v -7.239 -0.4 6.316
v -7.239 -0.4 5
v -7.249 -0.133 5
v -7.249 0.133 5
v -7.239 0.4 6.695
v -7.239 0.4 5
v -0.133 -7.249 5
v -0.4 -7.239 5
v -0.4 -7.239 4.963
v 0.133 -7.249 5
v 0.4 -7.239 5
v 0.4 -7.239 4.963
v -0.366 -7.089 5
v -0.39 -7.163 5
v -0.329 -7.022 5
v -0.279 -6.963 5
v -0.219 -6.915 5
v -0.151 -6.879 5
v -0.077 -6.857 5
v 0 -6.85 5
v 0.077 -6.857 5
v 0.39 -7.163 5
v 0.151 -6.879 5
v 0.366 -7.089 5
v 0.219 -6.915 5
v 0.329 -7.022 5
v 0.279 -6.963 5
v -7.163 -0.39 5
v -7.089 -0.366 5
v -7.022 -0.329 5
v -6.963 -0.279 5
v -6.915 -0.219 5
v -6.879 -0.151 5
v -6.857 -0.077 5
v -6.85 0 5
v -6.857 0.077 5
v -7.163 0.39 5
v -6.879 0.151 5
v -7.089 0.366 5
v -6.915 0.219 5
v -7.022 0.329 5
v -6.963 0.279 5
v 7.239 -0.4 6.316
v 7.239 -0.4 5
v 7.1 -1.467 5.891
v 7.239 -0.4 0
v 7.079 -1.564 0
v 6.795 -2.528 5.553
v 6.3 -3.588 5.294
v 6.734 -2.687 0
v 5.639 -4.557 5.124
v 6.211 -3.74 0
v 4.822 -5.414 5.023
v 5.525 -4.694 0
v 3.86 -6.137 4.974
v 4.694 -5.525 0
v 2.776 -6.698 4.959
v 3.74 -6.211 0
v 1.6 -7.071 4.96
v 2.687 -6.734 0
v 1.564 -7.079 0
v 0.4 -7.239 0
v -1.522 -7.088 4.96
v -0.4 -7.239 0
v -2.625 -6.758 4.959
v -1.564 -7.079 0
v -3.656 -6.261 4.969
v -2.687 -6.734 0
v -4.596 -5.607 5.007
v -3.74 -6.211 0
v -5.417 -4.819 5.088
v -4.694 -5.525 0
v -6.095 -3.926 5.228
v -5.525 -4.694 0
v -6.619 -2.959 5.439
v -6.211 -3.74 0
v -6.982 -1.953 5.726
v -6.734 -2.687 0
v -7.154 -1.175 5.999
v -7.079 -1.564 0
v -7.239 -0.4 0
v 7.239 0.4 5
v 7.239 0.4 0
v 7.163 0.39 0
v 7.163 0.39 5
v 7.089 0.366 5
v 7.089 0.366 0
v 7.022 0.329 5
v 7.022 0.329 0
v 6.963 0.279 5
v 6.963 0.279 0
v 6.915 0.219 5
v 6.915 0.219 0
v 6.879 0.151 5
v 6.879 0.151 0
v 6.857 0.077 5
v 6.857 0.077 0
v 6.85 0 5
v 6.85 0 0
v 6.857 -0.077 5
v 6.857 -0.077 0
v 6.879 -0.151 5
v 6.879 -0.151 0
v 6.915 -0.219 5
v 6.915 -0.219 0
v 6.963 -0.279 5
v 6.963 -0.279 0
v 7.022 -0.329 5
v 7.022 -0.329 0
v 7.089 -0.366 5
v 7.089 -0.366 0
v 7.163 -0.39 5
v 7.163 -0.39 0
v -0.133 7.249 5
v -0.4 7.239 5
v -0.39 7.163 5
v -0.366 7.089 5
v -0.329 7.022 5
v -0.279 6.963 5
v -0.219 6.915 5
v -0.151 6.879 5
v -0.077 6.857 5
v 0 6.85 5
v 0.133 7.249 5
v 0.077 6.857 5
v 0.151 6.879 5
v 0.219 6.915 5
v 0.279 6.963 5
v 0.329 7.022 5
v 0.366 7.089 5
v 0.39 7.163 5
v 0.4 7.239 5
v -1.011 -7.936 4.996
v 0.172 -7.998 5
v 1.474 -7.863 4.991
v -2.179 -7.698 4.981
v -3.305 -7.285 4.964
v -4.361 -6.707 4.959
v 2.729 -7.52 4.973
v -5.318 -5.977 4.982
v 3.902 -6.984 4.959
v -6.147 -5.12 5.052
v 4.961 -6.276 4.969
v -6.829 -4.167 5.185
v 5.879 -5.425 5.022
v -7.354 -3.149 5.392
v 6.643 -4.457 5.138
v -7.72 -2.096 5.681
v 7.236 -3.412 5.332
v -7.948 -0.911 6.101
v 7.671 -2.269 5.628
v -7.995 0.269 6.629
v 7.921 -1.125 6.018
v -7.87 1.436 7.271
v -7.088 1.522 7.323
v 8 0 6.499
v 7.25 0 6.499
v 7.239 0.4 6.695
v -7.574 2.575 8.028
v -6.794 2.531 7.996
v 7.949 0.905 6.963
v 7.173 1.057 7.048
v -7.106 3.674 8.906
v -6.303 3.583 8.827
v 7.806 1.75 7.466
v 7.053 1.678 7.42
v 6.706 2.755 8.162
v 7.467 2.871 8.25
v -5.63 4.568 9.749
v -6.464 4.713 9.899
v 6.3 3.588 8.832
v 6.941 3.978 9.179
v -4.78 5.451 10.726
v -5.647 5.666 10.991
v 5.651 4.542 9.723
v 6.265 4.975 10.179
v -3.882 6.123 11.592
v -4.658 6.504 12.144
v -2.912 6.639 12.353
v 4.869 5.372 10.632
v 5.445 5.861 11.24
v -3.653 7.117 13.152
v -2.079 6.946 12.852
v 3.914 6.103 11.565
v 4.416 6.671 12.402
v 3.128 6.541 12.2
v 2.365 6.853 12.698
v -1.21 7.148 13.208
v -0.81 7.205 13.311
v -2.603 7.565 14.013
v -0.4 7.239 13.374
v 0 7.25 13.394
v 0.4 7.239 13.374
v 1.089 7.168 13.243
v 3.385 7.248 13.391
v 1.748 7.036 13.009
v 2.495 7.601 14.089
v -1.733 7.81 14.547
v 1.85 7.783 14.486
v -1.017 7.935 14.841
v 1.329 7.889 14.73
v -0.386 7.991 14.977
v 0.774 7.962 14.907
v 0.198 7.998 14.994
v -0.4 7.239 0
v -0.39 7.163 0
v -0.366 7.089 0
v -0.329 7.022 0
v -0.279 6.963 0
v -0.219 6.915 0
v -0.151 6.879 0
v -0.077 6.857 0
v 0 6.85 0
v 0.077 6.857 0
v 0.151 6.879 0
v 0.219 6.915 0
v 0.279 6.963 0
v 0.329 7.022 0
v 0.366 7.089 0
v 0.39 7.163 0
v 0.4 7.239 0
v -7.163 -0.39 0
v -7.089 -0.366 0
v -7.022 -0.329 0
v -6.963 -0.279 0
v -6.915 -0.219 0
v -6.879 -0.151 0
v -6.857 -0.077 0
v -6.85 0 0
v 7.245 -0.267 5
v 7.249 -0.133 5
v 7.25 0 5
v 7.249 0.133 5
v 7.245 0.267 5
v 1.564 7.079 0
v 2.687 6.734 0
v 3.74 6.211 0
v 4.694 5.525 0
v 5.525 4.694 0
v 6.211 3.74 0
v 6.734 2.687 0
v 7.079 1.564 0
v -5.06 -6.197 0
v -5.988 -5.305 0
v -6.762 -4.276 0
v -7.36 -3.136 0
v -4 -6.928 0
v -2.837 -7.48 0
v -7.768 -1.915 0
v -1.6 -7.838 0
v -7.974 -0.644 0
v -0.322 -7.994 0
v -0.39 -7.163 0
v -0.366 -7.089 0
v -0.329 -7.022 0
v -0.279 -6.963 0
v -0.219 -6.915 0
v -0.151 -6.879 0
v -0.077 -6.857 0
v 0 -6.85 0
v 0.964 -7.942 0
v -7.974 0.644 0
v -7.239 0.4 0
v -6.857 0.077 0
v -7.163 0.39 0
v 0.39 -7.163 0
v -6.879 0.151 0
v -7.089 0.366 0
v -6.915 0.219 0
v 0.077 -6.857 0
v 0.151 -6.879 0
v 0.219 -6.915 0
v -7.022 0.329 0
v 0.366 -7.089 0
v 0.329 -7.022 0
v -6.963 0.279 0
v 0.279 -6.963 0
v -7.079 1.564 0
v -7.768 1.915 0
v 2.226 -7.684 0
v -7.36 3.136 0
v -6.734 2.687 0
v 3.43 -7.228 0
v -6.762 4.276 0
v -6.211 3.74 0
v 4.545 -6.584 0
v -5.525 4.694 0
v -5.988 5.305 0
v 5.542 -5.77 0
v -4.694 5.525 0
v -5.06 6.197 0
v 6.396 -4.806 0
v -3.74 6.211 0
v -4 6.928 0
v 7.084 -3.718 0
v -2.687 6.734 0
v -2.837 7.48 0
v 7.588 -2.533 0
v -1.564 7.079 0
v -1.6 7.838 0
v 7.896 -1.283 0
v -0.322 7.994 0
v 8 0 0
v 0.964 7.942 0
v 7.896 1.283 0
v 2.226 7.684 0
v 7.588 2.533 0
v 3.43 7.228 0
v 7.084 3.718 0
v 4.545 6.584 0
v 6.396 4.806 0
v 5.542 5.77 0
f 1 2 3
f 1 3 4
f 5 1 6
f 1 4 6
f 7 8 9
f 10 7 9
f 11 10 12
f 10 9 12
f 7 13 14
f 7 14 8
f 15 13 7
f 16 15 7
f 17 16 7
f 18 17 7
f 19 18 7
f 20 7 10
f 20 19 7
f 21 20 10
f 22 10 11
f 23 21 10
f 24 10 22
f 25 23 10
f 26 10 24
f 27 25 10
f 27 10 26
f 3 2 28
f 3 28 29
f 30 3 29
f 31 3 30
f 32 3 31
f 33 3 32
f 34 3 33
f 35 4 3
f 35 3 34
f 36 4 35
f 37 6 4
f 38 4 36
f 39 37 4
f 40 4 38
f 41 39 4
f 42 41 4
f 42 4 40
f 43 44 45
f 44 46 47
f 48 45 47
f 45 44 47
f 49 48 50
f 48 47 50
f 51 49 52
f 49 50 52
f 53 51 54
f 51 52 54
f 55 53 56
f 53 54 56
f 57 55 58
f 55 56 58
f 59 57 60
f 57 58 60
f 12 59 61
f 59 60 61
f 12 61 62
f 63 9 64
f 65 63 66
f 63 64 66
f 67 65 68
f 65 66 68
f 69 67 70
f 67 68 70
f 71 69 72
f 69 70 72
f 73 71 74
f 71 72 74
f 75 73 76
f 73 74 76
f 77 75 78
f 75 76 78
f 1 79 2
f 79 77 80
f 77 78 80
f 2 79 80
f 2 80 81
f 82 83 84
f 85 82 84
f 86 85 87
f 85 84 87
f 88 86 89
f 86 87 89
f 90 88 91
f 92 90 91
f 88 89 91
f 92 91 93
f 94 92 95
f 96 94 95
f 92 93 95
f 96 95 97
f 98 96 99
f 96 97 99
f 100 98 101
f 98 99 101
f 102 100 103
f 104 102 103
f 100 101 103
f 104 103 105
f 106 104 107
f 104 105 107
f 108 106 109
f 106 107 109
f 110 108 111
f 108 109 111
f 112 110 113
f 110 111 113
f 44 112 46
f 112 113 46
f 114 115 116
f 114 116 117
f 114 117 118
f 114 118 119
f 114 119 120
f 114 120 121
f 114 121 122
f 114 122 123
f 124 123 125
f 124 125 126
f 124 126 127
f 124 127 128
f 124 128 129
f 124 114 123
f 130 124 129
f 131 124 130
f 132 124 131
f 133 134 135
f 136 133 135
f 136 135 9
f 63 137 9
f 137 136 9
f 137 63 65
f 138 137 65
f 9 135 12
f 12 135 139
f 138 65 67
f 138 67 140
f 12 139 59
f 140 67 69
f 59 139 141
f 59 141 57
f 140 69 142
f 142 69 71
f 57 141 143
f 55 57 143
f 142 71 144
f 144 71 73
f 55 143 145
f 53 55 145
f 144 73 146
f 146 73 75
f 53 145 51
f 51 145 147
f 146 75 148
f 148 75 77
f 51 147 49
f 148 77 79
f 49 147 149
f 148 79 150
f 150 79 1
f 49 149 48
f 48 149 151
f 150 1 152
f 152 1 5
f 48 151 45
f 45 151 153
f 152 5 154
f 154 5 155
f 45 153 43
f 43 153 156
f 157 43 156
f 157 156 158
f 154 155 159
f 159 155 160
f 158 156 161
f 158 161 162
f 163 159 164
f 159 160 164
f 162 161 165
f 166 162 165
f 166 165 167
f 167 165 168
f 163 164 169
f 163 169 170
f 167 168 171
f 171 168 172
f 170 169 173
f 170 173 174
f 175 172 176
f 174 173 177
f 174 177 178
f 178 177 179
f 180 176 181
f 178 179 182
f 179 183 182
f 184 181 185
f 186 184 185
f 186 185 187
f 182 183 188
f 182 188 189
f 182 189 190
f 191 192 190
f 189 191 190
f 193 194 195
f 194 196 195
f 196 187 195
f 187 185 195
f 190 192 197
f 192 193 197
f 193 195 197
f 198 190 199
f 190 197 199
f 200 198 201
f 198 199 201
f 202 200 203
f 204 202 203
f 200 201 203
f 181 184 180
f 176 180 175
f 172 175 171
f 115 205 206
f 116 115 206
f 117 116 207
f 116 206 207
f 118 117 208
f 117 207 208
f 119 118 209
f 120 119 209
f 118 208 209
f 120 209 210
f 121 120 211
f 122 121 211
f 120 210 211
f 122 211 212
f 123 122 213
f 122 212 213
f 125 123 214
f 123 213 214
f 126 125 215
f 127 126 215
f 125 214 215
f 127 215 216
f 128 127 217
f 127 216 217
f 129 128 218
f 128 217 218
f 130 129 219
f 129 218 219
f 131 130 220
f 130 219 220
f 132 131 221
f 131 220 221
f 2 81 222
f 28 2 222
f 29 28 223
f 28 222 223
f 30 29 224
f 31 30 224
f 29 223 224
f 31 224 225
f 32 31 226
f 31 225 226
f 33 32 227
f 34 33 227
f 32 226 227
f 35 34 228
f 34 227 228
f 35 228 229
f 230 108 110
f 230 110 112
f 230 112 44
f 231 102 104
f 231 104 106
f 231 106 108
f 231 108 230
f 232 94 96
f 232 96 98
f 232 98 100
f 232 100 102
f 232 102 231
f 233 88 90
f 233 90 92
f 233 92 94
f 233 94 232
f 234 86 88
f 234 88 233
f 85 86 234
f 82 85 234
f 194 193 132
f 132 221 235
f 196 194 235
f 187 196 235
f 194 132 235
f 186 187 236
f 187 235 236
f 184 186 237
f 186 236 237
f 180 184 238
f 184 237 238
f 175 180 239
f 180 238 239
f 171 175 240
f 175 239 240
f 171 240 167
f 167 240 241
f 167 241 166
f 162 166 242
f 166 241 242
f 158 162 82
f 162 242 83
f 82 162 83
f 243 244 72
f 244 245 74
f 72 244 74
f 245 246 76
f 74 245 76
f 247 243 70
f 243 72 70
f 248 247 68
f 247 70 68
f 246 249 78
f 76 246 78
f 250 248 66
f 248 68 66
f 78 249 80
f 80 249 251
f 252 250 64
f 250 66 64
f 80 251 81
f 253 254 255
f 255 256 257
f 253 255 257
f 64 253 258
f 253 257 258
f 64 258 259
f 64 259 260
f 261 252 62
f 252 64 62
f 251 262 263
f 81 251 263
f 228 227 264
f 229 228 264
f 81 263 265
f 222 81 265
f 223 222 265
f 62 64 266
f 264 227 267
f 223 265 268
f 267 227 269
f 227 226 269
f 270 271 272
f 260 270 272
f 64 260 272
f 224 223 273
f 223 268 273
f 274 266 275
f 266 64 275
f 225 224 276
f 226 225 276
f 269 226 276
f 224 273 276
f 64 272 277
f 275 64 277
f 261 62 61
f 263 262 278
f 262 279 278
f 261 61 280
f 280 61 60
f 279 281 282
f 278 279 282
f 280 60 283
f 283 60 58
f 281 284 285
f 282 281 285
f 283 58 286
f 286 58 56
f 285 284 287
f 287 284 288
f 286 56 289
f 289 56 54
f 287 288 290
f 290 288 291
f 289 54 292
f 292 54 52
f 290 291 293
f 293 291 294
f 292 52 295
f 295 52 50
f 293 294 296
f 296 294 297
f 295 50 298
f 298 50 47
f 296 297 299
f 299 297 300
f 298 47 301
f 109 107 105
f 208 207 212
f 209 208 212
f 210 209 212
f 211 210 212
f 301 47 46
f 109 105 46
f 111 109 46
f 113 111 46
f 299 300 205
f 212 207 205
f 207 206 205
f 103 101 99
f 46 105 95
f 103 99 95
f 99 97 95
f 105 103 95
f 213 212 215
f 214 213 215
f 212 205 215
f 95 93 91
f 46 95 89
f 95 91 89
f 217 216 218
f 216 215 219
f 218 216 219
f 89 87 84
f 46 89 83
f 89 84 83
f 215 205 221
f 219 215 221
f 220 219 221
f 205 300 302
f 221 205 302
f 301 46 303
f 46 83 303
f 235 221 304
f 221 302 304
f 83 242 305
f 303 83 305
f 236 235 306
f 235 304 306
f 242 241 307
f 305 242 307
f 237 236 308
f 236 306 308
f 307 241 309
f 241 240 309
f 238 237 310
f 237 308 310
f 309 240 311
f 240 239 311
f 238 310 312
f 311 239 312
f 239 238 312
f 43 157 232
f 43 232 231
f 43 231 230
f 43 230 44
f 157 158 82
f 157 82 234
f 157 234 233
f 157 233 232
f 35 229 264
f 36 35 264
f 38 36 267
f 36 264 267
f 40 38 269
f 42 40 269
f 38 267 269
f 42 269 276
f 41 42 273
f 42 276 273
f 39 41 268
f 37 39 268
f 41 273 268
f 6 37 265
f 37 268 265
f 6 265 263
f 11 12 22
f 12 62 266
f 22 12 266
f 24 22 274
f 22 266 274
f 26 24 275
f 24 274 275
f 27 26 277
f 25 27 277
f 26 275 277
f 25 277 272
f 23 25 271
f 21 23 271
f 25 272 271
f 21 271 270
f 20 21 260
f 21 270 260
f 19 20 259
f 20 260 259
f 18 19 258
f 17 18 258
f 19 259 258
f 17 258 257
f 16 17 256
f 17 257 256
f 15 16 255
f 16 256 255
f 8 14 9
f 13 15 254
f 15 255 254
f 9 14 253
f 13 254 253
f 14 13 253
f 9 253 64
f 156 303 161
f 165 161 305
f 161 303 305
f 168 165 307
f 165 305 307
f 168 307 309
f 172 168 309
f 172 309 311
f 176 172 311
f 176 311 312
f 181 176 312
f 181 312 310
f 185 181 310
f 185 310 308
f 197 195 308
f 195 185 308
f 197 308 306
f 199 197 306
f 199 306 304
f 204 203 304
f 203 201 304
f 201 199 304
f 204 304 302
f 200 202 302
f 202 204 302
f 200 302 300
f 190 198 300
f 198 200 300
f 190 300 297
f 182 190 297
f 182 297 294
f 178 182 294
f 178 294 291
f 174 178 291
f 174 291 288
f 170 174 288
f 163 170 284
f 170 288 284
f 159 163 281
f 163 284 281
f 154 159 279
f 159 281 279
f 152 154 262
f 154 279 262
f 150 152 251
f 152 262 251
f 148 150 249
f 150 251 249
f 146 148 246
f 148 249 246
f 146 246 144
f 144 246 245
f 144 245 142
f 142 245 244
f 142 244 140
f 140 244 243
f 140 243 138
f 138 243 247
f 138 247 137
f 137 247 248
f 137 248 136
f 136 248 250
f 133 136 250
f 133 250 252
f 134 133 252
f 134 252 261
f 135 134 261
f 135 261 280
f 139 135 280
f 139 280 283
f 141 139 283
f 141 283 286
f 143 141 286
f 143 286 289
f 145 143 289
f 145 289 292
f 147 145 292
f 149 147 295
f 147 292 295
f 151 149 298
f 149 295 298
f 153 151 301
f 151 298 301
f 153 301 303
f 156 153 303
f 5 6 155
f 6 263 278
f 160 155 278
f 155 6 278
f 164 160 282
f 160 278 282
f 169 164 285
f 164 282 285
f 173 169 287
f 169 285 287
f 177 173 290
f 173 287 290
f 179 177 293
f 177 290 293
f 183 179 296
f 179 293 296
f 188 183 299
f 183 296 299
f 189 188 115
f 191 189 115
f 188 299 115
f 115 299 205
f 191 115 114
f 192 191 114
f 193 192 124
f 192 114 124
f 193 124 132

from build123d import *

# Parameters (mm, degrees)
F0_R     = 8
F1_DEPTH = 15
F3_DEPTH = 12.5
F4_DEPTH = 5


with BuildPart() as f1:
    # F0 (on Top) → F1 (new body)
    with BuildSketch(Plane.XY):
        Circle(F0_R)
        with BuildLine():
            ThreePointArc((0.3998477713, 7.2389655172), (5.1265241636, 5.1265241636), (7.2389655172, 0.3998477713))
            ThreePointArc((7.2389655172, 0.3998477713), (7.5289141507, 0.2867174507), (7.65, 0))
            ThreePointArc((7.65, 0), (7.5289141507, -0.2867174507), (7.2389655172, -0.3998477713))
            ThreePointArc((7.2389655172, -0.3998477713), (5.1265241636, -5.1265241636), (0.3998477713, -7.2389655172))
            ThreePointArc((0.3998477713, -7.2389655172), (0.399961941, -7.2444822336), (0.4, -7.25))
            ThreePointArc((0.4, -7.25), (-0.0055177664, -7.649961941), (-0.3998477713, -7.2389655172))
            ThreePointArc((-0.3998477713, -7.2389655172), (-5.1265241636, -5.1265241636), (-7.2389655172, -0.3998477713))
            ThreePointArc((-7.2389655172, -0.3998477713), (-7.65, 0), (-7.2389655172, 0.3998477713))
            ThreePointArc((-7.2389655172, 0.3998477713), (-5.1265241636, 5.1265241636), (-0.3998477713, 7.2389655172))
            ThreePointArc((-0.3998477713, 7.2389655172), (-0.0055177664, 7.649961941), (0.4, 7.25))
            ThreePointArc((0.4, 7.25), (0.399961941, 7.2444822336), (0.3998477713, 7.2389655172))
        make_face(mode=Mode.SUBTRACT)
        with BuildLine():
            ThreePointArc((-7.2389655172, -0.3998477713), (-7.25, 0), (-7.2389655172, 0.3998477713))
            ThreePointArc((-7.2389655172, 0.3998477713), (-7.65, 0), (-7.2389655172, -0.3998477713))
        make_face()
        with BuildLine():
            ThreePointArc((0.4, -7.25), (0.399961941, -7.2444822336), (0.3998477713, -7.2389655172))
            ThreePointArc((0.3998477713, -7.2389655172), (0, -7.25), (-0.3998477713, -7.2389655172))
            ThreePointArc((-0.3998477713, -7.2389655172), (-0.0055177664, -7.649961941), (0.4, -7.25))
        make_face()
        with BuildLine():
            ThreePointArc((7.2389655172, 0.3998477713), (7.2472408543, 0.2), (7.25, 0))
            ThreePointArc((7.25, 0), (7.2472408543, -0.2), (7.2389655172, -0.3998477713))
            ThreePointArc((7.2389655172, -0.3998477713), (7.5289141507, -0.2867174507), (7.65, 0))
            ThreePointArc((7.65, 0), (7.5289141507, 0.2867174507), (7.2389655172, 0.3998477713))
        make_face()
        with BuildLine():
            ThreePointArc((-0.3998477713, 7.2389655172), (0, 7.25), (0.3998477713, 7.2389655172))
            ThreePointArc((0.3998477713, 7.2389655172), (0.399961941, 7.2444822336), (0.4, 7.25))
            ThreePointArc((0.4, 7.25), (-0.0055177664, 7.649961941), (-0.3998477713, 7.2389655172))
        make_face()
    extrude(amount=F1_DEPTH)

    # F2 (on Right) → F3 (cut, symmetric)
    with BuildSketch(Plane.YZ):
        Polygon((-8, 15), (-8, 5), (8, 15), align=None)
        with BuildLine():
            Line((8, 15), (-8, 5))
            ThreePointArc((-8, 5), (1.6308873071, 7.3905803087), (8, 15))
        make_face()
    extrude(amount=F3_DEPTH, both=True, mode=Mode.SUBTRACT)

    # F0 (on Top) → F4 (join)
    with BuildSketch(Plane.XY):
        with BuildLine():
            ThreePointArc((-6.85, 0), (-6.9632825493, 0.2789141507), (-7.2389655172, 0.3998477713))
            ThreePointArc((-7.2389655172, 0.3998477713), (-7.25, 0), (-7.2389655172, -0.3998477713))
            ThreePointArc((-7.2389655172, -0.3998477713), (-6.9632825493, -0.2789141507), (-6.85, 0))
        make_face()
        with BuildLine():
            ThreePointArc((-0.3998477713, -7.2389655172), (0, -7.25), (0.3998477713, -7.2389655172))
            ThreePointArc((0.3998477713, -7.2389655172), (0, -6.85), (-0.3998477713, -7.2389655172))
        make_face()
        with BuildLine():
            ThreePointArc((7.2389655172, -0.3998477713), (7.2472408543, -0.2), (7.25, 0))
            ThreePointArc((7.25, 0), (7.2472408543, 0.2), (7.2389655172, 0.3998477713))
            ThreePointArc((7.2389655172, 0.3998477713), (6.85, 0), (7.2389655172, -0.3998477713))
        make_face()
        with BuildLine():
            ThreePointArc((-0.3998477713, 7.2389655172), (0, 6.85), (0.3998477713, 7.2389655172))
            ThreePointArc((0.3998477713, 7.2389655172), (0, 7.25), (-0.3998477713, 7.2389655172))
        make_face()
    extrude(amount=F4_DEPTH)


solid = f1.part
